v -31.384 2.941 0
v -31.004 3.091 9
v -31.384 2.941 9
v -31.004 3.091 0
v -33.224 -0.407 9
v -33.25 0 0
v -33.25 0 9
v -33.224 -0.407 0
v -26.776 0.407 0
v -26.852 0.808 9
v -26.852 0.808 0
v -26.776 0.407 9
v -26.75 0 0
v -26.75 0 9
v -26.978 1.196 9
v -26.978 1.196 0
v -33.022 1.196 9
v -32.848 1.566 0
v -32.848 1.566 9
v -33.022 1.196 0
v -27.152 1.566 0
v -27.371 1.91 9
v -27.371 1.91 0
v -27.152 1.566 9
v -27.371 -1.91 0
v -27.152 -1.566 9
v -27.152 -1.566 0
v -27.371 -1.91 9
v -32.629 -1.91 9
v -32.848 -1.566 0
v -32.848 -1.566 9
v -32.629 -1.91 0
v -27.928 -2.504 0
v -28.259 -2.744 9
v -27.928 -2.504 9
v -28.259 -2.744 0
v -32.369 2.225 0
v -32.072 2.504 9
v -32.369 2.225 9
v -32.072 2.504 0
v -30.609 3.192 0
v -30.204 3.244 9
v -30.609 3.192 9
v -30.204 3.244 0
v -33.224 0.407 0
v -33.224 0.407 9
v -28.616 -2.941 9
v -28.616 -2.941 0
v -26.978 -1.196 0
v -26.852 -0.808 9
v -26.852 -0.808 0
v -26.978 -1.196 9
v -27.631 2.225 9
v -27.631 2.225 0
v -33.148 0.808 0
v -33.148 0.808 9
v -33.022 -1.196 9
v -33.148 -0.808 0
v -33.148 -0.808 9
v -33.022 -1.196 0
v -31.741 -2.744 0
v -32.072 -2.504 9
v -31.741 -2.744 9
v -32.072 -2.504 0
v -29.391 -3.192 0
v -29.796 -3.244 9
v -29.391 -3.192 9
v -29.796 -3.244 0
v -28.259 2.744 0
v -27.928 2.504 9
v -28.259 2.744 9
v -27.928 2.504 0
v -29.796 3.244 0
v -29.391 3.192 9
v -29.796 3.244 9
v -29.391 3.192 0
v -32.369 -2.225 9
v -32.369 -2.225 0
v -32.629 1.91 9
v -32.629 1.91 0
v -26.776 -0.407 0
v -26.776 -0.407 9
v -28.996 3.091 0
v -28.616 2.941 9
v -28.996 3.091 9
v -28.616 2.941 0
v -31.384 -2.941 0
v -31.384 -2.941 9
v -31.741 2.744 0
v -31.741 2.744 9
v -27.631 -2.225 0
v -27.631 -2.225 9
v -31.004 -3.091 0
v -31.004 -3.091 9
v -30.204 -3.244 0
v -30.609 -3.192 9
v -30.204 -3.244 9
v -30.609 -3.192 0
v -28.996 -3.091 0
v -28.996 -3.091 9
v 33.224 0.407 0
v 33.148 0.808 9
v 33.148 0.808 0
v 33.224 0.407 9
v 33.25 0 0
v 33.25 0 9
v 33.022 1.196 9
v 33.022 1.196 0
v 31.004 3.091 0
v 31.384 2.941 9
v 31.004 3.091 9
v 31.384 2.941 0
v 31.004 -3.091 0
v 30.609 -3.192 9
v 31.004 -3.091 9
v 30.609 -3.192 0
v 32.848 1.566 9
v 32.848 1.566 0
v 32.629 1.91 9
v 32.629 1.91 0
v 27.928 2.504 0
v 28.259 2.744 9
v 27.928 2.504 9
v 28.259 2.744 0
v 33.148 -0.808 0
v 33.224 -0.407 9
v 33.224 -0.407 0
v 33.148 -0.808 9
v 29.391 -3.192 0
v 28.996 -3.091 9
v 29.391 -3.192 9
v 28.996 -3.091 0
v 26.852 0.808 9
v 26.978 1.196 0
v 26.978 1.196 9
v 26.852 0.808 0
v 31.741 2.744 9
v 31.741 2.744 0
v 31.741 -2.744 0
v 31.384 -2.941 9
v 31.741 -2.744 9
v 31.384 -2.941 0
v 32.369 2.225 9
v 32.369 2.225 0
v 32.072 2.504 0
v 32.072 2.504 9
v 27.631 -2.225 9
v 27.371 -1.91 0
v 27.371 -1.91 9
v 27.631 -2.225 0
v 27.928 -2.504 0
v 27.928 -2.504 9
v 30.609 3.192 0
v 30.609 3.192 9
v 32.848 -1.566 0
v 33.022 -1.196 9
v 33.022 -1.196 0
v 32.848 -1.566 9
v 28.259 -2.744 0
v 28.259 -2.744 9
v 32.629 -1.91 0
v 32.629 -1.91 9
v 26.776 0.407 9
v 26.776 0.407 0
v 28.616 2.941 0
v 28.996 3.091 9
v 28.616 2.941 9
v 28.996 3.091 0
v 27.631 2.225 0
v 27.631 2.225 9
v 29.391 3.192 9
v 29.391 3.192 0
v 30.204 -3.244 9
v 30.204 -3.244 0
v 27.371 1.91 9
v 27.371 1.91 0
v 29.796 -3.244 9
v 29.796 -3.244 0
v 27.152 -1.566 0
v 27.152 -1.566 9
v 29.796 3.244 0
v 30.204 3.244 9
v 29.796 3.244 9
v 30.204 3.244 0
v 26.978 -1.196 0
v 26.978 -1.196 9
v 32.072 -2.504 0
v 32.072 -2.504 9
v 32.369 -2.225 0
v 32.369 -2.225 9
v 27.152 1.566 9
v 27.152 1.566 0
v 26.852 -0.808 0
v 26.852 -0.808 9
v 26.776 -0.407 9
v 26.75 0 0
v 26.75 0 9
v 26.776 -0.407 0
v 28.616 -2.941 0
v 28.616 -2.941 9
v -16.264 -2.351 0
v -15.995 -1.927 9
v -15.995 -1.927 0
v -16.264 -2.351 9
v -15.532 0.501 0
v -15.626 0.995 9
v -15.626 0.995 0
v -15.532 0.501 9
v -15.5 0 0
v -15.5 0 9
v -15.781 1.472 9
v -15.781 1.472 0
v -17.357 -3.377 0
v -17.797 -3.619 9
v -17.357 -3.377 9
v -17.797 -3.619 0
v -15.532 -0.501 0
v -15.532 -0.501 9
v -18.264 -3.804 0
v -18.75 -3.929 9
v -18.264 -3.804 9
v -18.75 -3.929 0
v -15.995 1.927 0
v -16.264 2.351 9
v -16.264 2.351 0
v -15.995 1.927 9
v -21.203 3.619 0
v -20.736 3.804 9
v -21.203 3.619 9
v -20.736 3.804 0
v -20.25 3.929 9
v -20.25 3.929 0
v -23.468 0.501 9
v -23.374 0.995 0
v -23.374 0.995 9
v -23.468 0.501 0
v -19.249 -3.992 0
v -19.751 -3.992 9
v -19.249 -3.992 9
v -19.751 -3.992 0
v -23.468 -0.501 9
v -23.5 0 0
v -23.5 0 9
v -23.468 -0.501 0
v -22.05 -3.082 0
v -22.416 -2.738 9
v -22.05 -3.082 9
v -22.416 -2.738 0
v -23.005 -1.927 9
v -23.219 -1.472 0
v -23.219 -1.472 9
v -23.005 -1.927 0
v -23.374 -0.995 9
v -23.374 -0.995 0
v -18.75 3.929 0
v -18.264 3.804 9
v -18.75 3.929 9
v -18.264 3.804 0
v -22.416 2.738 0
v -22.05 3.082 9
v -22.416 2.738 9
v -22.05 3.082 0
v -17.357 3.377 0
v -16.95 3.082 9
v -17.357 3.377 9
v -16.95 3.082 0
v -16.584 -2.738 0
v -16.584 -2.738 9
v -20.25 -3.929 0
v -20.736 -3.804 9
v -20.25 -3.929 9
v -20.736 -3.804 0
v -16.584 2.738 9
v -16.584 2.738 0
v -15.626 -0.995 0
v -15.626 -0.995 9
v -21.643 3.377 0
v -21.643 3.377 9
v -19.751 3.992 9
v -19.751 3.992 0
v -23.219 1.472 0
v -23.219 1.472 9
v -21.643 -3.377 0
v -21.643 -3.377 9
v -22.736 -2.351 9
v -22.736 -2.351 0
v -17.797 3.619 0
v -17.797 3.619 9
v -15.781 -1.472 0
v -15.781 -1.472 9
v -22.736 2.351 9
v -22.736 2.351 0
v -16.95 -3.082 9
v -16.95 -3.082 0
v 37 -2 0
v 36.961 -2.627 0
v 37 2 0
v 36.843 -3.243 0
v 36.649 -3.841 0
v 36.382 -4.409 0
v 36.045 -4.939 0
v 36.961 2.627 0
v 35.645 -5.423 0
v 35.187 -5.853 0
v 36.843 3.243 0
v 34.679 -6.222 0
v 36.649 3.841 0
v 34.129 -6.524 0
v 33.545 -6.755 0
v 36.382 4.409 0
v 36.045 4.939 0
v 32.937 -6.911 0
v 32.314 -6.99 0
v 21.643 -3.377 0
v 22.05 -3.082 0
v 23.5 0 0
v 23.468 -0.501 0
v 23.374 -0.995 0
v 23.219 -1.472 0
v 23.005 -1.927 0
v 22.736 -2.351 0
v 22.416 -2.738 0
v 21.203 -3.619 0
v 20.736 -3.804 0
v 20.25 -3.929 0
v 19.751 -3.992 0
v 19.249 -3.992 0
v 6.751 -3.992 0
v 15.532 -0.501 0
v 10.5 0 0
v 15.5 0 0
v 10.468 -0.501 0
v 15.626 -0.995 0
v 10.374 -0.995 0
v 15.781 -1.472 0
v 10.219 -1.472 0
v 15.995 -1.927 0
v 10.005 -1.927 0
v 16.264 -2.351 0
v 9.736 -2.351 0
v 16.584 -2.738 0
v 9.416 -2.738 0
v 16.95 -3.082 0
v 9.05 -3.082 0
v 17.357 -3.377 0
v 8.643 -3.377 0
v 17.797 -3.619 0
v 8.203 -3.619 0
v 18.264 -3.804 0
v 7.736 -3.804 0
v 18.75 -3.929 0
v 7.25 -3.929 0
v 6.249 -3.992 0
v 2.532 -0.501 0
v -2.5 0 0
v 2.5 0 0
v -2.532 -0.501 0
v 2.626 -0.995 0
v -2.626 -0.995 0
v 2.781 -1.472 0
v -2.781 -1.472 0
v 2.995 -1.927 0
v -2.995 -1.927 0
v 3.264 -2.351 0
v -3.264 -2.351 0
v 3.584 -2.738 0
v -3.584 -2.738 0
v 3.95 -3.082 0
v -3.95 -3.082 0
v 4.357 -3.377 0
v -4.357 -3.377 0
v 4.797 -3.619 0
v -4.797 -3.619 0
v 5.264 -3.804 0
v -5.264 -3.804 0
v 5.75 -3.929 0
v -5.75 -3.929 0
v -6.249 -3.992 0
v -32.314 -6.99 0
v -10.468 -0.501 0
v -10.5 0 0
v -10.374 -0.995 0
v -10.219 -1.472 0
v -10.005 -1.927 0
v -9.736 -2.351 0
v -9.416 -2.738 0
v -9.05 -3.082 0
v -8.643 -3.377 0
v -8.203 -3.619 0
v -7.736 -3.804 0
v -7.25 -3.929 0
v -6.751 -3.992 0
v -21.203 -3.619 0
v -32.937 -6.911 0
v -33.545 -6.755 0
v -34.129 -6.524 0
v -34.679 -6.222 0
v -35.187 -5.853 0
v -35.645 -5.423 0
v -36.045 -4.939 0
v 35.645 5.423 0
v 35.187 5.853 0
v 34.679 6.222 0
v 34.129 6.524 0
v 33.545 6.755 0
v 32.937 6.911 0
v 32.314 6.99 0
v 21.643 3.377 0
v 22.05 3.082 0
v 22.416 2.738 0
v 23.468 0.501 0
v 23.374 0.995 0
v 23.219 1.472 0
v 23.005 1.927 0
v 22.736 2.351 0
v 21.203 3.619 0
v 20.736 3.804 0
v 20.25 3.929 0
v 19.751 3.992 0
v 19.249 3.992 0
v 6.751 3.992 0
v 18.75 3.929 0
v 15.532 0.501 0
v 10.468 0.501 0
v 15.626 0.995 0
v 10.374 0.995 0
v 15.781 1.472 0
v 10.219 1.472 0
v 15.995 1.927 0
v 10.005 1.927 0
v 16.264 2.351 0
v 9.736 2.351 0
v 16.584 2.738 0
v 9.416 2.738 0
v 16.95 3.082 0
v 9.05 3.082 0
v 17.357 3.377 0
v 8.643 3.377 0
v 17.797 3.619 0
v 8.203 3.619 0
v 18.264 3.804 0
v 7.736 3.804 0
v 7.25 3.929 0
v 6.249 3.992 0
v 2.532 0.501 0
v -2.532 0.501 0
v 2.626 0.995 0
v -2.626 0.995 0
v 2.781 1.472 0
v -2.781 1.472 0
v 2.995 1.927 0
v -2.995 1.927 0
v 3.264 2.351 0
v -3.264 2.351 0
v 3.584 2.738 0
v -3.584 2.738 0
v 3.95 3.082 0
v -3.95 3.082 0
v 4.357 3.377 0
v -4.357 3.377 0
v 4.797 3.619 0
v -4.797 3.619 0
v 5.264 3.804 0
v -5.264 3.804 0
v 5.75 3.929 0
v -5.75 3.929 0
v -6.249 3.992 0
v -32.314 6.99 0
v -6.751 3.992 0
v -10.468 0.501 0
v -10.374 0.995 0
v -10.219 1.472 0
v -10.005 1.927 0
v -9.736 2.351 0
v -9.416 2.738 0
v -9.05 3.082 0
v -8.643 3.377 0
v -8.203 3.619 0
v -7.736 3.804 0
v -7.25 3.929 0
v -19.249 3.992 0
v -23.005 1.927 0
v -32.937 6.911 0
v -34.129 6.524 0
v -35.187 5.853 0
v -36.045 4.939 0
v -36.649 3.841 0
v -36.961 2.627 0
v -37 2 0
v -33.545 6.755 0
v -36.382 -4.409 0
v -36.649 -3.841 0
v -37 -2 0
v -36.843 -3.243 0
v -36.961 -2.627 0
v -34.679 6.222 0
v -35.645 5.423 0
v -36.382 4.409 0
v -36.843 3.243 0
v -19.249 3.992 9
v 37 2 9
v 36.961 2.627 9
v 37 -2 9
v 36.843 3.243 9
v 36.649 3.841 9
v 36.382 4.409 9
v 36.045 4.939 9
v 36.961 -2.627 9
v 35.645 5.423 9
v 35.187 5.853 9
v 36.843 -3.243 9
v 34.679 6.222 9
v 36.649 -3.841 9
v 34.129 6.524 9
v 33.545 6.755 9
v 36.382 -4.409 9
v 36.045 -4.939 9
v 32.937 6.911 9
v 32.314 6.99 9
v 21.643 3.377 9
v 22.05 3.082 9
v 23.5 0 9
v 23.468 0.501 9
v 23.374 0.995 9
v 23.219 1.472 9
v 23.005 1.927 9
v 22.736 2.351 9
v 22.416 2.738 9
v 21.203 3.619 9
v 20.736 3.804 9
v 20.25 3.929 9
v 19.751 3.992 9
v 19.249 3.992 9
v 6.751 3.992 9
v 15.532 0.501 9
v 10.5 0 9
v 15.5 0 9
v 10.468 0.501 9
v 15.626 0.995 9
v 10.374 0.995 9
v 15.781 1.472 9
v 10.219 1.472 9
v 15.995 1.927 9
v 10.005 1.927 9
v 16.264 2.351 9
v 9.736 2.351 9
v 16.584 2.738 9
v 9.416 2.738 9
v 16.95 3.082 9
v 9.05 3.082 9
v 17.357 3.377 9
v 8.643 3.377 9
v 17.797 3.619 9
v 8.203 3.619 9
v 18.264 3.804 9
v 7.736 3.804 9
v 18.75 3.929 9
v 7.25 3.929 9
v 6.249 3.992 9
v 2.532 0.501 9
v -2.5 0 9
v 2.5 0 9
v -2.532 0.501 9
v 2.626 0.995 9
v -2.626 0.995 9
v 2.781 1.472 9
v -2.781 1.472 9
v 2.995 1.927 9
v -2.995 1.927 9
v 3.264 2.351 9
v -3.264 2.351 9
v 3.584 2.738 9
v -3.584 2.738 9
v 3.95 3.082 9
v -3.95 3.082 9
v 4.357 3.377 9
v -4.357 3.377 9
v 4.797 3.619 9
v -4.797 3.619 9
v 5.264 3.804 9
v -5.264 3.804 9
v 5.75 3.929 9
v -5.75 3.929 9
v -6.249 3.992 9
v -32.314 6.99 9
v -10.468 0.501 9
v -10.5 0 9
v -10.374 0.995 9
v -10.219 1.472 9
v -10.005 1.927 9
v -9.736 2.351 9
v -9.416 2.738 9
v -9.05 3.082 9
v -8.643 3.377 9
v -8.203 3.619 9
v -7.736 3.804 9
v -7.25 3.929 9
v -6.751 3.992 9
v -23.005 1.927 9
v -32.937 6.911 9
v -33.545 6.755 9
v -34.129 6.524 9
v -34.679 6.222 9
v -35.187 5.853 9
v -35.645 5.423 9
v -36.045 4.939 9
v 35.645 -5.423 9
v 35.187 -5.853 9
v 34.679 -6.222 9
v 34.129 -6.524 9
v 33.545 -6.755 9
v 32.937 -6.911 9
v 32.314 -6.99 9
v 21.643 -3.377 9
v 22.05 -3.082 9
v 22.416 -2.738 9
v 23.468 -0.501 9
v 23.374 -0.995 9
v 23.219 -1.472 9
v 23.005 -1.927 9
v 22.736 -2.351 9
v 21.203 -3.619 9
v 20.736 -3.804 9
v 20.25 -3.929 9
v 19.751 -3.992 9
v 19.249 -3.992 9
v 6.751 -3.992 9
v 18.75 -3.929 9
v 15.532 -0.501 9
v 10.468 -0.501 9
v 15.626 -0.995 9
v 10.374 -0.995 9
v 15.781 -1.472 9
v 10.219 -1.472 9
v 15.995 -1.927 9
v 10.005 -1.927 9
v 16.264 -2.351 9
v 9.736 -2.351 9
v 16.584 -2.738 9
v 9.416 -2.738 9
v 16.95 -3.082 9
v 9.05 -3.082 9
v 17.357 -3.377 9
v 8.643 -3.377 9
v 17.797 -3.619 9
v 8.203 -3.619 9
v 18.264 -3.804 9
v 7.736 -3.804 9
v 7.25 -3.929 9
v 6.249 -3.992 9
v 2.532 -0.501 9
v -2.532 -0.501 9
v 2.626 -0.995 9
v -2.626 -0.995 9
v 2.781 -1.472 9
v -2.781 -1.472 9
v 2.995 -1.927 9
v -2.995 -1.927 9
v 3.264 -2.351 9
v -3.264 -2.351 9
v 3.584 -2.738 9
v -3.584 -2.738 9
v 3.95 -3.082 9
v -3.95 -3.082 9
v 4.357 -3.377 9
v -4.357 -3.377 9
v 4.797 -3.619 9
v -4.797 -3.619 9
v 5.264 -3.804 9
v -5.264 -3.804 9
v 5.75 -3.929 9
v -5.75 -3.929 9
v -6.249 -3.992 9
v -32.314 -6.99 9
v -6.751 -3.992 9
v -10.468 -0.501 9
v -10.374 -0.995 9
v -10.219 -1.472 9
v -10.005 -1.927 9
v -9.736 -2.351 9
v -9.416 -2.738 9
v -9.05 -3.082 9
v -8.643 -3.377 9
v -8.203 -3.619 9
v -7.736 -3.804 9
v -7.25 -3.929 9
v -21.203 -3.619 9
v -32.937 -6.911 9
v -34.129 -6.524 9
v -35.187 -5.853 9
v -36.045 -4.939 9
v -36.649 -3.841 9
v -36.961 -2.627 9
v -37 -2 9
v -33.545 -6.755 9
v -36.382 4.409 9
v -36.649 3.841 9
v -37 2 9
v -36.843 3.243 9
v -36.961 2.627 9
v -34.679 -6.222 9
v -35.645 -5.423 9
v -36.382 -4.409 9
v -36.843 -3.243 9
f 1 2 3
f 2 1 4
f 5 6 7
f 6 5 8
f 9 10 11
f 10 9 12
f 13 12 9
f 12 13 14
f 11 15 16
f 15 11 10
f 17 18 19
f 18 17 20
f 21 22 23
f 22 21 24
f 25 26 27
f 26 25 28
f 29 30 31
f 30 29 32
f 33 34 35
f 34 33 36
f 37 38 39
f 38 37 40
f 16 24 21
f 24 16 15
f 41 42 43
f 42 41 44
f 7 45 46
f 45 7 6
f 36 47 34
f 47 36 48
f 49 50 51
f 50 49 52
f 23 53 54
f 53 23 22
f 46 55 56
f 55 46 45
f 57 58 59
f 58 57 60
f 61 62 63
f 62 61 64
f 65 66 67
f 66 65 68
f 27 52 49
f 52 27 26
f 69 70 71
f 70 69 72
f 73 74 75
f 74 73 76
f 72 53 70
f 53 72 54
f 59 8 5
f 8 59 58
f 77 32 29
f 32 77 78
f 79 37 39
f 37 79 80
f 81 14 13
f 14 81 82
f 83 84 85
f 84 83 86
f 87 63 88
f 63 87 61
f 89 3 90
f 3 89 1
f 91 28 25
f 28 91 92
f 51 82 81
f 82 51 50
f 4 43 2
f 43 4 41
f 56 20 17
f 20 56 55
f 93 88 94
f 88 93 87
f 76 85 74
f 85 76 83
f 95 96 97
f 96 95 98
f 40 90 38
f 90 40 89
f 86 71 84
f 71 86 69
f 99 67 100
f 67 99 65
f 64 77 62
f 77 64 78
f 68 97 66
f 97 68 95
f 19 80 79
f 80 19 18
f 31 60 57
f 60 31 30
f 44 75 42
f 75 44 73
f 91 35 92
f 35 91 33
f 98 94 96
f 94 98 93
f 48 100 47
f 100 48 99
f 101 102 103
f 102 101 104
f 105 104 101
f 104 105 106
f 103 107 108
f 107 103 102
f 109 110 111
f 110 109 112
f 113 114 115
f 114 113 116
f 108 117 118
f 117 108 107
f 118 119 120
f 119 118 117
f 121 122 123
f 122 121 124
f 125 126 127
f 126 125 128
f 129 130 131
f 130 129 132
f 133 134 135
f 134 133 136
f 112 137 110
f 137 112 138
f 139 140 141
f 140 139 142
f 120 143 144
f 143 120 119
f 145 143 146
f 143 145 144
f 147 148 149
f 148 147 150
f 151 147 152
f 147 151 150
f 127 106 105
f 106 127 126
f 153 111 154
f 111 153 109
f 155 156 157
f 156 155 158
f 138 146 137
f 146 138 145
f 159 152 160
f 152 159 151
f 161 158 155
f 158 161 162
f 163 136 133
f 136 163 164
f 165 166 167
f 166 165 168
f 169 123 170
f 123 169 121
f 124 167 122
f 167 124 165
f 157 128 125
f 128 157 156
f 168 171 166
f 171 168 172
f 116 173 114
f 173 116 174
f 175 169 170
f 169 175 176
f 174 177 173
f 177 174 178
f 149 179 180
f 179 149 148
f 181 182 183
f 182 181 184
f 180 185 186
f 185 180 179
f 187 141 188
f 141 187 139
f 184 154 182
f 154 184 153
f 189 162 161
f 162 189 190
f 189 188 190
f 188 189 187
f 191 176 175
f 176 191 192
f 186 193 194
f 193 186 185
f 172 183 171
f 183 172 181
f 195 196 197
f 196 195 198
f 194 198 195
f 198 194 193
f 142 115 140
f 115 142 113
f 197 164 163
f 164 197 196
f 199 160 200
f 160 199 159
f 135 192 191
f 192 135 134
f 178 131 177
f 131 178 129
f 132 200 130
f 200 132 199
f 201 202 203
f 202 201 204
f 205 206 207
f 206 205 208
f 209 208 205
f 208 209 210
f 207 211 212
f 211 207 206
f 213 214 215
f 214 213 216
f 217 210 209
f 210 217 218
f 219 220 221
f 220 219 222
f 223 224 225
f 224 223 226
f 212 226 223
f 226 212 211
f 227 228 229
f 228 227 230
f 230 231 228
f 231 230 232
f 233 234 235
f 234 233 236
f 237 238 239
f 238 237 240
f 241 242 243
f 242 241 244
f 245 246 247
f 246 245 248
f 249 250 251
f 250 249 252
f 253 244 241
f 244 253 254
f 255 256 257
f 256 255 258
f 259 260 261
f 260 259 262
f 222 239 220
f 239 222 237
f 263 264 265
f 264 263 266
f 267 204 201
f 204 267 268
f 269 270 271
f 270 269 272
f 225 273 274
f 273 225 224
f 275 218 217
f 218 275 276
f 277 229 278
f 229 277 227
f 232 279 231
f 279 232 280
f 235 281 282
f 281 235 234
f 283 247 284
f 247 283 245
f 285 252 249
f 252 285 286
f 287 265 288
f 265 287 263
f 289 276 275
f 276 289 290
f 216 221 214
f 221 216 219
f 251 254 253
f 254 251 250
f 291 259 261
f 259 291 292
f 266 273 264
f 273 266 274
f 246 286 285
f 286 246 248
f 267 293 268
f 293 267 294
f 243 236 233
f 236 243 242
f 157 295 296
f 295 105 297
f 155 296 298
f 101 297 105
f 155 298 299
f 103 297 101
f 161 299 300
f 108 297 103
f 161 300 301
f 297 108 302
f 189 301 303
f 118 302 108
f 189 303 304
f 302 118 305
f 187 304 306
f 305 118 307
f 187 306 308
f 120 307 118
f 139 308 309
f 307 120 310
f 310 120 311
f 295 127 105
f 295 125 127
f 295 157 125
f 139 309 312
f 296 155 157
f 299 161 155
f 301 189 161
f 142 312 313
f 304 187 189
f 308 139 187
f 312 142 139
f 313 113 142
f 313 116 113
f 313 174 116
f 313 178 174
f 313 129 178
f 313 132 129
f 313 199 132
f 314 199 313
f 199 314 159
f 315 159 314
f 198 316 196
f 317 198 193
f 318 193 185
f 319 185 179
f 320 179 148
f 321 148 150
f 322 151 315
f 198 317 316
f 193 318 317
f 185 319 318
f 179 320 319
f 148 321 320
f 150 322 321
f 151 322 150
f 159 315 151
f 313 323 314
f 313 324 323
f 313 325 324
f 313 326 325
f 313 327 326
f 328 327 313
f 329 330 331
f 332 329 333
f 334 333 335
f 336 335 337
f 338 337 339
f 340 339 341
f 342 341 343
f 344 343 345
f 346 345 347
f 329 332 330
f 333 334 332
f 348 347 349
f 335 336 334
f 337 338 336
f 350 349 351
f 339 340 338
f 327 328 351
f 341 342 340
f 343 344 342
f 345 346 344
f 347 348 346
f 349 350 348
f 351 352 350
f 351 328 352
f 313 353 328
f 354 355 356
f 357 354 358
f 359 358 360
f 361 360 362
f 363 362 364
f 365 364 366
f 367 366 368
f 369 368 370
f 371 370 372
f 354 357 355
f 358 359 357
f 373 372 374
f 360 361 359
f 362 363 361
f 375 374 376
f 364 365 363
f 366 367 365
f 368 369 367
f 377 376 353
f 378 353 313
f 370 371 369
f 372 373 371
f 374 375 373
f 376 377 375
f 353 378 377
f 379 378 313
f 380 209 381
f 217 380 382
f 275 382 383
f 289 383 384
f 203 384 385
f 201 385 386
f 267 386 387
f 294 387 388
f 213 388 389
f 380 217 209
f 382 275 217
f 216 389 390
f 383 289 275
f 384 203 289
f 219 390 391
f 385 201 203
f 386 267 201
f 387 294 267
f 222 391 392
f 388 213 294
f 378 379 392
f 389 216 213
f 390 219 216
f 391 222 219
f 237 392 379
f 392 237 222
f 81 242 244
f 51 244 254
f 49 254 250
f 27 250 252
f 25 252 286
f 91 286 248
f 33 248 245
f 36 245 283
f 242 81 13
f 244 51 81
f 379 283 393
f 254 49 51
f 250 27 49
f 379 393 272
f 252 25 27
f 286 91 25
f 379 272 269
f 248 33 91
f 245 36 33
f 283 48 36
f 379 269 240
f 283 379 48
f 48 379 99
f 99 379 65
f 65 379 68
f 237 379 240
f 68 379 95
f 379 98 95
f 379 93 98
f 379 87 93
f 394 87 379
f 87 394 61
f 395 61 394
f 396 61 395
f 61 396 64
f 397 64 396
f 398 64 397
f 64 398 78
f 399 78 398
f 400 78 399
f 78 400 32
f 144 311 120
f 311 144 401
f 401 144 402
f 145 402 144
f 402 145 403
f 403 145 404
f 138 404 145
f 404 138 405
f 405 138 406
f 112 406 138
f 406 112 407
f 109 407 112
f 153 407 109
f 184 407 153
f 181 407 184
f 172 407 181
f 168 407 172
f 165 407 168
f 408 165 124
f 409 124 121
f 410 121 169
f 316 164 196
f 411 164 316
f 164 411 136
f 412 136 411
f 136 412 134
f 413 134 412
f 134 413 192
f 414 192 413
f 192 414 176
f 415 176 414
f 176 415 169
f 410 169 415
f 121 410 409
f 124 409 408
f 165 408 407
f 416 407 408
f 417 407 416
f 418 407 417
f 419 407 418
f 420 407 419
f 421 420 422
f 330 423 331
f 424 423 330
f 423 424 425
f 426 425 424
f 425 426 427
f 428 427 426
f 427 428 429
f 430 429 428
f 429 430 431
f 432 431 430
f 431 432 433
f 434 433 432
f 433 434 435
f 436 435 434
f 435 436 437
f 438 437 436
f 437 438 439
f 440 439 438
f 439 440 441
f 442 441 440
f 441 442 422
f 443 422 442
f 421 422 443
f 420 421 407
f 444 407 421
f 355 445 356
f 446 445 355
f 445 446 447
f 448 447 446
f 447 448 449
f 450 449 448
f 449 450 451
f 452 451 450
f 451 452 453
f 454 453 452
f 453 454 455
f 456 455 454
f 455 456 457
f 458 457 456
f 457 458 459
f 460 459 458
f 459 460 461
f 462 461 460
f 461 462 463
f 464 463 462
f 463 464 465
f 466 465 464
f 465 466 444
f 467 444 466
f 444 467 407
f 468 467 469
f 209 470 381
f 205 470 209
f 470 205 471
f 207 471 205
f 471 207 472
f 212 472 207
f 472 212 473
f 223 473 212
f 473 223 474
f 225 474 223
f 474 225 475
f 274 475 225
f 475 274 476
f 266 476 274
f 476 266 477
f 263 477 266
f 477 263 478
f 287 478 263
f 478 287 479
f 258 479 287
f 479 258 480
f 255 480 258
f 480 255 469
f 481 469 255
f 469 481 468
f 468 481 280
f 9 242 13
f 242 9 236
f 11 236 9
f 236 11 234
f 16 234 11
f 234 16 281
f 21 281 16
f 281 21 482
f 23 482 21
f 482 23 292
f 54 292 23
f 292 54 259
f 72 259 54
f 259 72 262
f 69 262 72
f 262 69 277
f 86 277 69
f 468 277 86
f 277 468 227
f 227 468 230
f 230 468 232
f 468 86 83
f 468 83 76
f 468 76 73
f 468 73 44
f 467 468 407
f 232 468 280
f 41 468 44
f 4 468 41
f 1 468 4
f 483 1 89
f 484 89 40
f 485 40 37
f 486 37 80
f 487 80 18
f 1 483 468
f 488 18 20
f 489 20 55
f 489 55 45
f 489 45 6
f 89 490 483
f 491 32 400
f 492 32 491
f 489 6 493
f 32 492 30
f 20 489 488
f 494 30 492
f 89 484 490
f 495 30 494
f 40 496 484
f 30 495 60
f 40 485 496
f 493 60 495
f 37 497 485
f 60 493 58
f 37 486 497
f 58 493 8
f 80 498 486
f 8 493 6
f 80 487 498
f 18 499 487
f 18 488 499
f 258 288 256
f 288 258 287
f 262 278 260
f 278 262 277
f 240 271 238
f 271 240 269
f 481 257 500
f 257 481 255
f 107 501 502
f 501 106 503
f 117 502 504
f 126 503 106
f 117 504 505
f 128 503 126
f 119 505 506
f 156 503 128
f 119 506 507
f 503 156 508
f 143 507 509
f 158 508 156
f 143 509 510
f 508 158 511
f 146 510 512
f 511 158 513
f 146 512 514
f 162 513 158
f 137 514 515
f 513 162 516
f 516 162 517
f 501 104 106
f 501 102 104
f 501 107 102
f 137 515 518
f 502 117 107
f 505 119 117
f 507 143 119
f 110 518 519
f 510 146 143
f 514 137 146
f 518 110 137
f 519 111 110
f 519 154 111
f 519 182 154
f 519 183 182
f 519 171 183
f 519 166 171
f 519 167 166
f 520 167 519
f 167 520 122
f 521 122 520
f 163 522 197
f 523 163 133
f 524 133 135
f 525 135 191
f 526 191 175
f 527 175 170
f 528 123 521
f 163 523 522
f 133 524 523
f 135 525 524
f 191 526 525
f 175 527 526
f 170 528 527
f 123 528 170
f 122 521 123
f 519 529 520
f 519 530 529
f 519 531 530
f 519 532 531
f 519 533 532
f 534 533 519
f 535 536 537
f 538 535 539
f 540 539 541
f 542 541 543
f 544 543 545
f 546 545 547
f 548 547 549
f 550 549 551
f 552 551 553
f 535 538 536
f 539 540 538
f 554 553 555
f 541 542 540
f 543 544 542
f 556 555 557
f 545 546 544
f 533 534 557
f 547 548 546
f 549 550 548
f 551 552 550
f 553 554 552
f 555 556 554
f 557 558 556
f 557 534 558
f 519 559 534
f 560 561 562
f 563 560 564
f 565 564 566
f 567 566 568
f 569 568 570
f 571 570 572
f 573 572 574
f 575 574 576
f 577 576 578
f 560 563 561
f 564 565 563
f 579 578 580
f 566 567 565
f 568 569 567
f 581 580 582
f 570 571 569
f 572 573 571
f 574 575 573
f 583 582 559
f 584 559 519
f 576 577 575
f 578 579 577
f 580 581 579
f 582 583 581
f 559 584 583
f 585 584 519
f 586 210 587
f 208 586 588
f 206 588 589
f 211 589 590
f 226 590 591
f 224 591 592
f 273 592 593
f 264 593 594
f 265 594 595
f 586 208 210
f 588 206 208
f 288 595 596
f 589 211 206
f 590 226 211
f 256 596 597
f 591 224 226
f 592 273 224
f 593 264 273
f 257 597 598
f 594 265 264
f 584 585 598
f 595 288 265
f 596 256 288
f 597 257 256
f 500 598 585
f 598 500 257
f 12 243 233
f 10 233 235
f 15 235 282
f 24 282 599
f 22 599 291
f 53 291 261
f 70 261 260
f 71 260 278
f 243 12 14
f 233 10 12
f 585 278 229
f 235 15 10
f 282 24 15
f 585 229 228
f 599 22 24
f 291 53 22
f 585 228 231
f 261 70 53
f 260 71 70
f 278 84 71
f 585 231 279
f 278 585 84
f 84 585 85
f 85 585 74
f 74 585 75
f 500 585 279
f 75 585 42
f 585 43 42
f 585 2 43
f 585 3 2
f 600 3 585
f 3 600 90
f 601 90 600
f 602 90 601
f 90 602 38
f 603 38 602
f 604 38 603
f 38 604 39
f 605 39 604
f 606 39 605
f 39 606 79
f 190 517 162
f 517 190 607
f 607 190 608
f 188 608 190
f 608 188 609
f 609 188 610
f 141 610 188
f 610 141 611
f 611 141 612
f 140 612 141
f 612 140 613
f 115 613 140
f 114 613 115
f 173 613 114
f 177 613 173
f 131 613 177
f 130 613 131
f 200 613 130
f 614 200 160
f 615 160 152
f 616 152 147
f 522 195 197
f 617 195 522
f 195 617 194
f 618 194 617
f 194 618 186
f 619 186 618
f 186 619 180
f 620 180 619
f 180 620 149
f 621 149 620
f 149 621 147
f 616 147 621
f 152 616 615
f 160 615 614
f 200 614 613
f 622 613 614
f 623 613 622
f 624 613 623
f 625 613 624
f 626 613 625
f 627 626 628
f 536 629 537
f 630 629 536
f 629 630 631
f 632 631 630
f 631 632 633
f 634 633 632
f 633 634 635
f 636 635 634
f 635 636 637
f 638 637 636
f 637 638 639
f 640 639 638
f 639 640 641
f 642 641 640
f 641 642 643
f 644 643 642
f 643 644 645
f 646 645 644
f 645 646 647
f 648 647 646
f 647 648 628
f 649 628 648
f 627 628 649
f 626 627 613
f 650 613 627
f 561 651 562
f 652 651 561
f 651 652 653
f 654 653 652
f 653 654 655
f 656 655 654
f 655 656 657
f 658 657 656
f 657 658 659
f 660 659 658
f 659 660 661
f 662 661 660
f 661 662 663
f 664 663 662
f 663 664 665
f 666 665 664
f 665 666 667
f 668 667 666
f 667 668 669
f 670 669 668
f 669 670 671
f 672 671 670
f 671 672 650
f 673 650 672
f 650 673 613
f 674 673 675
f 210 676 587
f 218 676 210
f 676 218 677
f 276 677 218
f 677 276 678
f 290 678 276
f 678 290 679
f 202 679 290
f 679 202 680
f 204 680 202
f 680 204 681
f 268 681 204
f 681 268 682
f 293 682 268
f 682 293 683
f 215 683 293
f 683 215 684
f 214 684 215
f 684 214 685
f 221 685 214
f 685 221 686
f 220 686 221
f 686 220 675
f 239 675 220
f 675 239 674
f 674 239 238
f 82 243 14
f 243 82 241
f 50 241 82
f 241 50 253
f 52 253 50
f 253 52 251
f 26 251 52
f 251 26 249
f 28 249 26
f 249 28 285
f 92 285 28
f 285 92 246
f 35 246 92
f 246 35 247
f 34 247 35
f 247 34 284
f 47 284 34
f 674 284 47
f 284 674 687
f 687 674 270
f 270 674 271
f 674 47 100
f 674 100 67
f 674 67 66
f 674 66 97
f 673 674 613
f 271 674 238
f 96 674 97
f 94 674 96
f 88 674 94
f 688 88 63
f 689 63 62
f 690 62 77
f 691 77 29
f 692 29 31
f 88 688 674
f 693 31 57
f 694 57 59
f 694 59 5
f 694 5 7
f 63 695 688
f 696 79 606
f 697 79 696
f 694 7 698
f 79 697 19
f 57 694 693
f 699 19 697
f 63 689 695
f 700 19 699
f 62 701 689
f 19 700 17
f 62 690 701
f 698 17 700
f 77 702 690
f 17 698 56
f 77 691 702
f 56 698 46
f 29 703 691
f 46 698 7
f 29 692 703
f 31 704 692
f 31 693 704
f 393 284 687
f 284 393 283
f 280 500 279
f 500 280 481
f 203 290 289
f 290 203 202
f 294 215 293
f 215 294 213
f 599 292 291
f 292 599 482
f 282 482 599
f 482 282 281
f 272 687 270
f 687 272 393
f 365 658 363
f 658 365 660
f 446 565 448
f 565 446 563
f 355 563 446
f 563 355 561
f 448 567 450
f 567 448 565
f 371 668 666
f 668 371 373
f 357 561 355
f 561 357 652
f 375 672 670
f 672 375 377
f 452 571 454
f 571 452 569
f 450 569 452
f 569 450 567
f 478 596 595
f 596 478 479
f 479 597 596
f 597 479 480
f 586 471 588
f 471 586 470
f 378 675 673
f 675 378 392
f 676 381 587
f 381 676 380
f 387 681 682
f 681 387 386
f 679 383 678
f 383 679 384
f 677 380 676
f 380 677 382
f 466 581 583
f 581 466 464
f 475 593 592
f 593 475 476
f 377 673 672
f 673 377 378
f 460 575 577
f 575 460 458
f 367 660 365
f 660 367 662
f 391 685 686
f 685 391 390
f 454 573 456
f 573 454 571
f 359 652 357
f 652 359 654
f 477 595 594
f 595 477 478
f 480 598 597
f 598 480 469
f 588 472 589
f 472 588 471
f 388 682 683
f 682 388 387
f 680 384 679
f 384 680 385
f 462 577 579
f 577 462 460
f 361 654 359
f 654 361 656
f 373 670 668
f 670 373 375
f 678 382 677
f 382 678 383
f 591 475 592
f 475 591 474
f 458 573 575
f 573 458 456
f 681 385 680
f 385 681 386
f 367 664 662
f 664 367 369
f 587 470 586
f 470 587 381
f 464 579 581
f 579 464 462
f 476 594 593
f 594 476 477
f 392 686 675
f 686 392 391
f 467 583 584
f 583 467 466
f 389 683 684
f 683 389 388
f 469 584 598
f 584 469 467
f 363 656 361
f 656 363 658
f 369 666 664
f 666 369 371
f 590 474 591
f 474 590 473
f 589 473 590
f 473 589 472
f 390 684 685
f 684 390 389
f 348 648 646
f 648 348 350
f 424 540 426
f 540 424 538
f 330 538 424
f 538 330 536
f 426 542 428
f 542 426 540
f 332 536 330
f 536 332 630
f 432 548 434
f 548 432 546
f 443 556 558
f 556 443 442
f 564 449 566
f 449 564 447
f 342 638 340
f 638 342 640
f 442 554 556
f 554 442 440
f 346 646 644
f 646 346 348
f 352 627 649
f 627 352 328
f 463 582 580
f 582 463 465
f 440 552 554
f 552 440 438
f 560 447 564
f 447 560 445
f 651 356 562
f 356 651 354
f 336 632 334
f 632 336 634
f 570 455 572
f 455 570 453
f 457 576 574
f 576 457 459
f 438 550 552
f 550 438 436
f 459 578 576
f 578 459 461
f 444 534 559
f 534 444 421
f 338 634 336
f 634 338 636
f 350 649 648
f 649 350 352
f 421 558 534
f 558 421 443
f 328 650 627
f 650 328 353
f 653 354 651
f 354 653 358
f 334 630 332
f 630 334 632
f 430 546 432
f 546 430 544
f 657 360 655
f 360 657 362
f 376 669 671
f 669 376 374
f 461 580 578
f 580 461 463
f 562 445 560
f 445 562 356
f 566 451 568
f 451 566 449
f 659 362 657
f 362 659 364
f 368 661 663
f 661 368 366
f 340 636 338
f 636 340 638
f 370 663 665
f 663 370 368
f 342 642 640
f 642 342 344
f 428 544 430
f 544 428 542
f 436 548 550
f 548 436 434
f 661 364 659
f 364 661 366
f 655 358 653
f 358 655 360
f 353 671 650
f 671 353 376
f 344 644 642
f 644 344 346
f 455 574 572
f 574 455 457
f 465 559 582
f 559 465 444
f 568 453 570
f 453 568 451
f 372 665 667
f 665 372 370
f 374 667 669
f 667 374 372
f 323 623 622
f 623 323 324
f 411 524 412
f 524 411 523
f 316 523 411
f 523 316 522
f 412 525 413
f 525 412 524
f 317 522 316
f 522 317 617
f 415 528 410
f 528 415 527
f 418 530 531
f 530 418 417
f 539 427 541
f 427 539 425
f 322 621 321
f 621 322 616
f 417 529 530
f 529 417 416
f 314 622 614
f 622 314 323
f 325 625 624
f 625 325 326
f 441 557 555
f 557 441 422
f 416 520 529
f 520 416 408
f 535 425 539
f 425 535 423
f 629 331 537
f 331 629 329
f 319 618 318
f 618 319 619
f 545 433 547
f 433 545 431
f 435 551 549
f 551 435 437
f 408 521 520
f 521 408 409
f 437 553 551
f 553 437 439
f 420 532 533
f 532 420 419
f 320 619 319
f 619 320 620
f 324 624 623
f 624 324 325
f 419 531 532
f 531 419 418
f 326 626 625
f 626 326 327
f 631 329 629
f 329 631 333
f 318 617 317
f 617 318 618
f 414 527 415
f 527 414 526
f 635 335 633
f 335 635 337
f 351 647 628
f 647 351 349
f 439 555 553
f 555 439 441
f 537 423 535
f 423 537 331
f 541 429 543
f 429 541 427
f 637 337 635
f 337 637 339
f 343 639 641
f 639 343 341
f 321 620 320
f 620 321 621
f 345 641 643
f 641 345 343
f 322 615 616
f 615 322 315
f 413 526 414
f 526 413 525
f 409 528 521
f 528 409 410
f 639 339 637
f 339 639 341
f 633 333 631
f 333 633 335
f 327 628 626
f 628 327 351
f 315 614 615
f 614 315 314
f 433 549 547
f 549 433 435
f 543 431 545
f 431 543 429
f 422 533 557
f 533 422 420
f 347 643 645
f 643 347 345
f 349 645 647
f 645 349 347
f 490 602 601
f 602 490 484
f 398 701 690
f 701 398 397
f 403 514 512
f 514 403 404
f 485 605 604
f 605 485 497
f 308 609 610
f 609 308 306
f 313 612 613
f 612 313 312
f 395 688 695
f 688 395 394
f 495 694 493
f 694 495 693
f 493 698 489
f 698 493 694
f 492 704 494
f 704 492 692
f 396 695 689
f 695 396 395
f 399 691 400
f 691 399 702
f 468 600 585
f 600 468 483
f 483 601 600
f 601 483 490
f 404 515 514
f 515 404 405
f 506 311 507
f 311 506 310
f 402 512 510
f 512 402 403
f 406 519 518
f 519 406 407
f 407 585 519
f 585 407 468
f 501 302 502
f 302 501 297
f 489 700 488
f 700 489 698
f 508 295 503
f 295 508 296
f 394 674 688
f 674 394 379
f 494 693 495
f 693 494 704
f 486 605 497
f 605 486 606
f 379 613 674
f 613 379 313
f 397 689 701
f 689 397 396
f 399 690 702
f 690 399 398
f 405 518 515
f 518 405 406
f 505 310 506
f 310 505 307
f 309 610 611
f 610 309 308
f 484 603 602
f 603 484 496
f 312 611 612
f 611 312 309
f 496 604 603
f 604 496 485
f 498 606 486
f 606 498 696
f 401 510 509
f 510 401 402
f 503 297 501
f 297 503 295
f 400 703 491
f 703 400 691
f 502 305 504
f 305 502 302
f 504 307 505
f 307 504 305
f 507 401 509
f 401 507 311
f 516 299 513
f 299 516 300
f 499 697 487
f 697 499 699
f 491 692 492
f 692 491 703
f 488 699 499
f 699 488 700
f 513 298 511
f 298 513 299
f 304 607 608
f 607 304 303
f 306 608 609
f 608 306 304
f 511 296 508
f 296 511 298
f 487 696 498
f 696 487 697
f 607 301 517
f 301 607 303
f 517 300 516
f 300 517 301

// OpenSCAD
$fn = 50;


difference() {
	union() {
		hull() {
			translate(v = [-32.0000000000, 2.0000000000, 0]) {
				cylinder(h = 9, r = 5);
			}
			translate(v = [32.0000000000, 2.0000000000, 0]) {
				cylinder(h = 9, r = 5);
			}
			translate(v = [-32.0000000000, -2.0000000000, 0]) {
				cylinder(h = 9, r = 5);
			}
			translate(v = [32.0000000000, -2.0000000000, 0]) {
				cylinder(h = 9, r = 5);
			}
		}
	}
	union() {
		#translate(v = [-30.0000000000, 0.0000000000, 0]) {
			cylinder(h = 9, r = 3.2500000000);
		}
		#translate(v = [30.0000000000, 0.0000000000, 0]) {
			cylinder(h = 9, r = 3.2500000000);
		}
		#translate(v = [-30.0000000000, 0.0000000000, -100.0000000000]) {
			cylinder(h = 200, r = 3.2500000000);
		}
		#translate(v = [-30.0000000000, 0.0000000000, -100.0000000000]) {
			cylinder(h = 200, r = 3.2500000000);
		}
		#translate(v = [30.0000000000, 0.0000000000, -100.0000000000]) {
			cylinder(h = 200, r = 3.2500000000);
		}
		#translate(v = [30.0000000000, 0.0000000000, -100.0000000000]) {
			cylinder(h = 200, r = 3.2500000000);
		}
		#translate(v = [-30.0000000000, 0.0000000000, 0]) {
			cylinder(h = 9, r = 1.8000000000);
		}
		#translate(v = [30.0000000000, 0.0000000000, 0]) {
			cylinder(h = 9, r = 1.8000000000);
		}
		#translate(v = [-30.0000000000, 0.0000000000, 0]) {
			cylinder(h = 9, r = 1.8000000000);
		}
		#translate(v = [30.0000000000, 0.0000000000, 0]) {
			cylinder(h = 9, r = 1.8000000000);
		}
		#translate(v = [-30.0000000000, 0.0000000000, 0]) {
			cylinder(h = 9, r = 1.8000000000);
		}
		#translate(v = [30.0000000000, 0.0000000000, 0]) {
			cylinder(h = 9, r = 1.8000000000);
		}
		#translate(v = [-19.5000000000, 0, 0]) {
			cylinder(h = 9, r = 4.0000000000);
		}
		#translate(v = [-6.5000000000, 0, 0]) {
			cylinder(h = 9, r = 4.0000000000);
		}
		#translate(v = [6.5000000000, 0, 0]) {
			cylinder(h = 9, r = 4.0000000000);
		}
		#translate(v = [19.5000000000, 0, 0]) {
			cylinder(h = 9, r = 4.0000000000);
		}
	}
}
